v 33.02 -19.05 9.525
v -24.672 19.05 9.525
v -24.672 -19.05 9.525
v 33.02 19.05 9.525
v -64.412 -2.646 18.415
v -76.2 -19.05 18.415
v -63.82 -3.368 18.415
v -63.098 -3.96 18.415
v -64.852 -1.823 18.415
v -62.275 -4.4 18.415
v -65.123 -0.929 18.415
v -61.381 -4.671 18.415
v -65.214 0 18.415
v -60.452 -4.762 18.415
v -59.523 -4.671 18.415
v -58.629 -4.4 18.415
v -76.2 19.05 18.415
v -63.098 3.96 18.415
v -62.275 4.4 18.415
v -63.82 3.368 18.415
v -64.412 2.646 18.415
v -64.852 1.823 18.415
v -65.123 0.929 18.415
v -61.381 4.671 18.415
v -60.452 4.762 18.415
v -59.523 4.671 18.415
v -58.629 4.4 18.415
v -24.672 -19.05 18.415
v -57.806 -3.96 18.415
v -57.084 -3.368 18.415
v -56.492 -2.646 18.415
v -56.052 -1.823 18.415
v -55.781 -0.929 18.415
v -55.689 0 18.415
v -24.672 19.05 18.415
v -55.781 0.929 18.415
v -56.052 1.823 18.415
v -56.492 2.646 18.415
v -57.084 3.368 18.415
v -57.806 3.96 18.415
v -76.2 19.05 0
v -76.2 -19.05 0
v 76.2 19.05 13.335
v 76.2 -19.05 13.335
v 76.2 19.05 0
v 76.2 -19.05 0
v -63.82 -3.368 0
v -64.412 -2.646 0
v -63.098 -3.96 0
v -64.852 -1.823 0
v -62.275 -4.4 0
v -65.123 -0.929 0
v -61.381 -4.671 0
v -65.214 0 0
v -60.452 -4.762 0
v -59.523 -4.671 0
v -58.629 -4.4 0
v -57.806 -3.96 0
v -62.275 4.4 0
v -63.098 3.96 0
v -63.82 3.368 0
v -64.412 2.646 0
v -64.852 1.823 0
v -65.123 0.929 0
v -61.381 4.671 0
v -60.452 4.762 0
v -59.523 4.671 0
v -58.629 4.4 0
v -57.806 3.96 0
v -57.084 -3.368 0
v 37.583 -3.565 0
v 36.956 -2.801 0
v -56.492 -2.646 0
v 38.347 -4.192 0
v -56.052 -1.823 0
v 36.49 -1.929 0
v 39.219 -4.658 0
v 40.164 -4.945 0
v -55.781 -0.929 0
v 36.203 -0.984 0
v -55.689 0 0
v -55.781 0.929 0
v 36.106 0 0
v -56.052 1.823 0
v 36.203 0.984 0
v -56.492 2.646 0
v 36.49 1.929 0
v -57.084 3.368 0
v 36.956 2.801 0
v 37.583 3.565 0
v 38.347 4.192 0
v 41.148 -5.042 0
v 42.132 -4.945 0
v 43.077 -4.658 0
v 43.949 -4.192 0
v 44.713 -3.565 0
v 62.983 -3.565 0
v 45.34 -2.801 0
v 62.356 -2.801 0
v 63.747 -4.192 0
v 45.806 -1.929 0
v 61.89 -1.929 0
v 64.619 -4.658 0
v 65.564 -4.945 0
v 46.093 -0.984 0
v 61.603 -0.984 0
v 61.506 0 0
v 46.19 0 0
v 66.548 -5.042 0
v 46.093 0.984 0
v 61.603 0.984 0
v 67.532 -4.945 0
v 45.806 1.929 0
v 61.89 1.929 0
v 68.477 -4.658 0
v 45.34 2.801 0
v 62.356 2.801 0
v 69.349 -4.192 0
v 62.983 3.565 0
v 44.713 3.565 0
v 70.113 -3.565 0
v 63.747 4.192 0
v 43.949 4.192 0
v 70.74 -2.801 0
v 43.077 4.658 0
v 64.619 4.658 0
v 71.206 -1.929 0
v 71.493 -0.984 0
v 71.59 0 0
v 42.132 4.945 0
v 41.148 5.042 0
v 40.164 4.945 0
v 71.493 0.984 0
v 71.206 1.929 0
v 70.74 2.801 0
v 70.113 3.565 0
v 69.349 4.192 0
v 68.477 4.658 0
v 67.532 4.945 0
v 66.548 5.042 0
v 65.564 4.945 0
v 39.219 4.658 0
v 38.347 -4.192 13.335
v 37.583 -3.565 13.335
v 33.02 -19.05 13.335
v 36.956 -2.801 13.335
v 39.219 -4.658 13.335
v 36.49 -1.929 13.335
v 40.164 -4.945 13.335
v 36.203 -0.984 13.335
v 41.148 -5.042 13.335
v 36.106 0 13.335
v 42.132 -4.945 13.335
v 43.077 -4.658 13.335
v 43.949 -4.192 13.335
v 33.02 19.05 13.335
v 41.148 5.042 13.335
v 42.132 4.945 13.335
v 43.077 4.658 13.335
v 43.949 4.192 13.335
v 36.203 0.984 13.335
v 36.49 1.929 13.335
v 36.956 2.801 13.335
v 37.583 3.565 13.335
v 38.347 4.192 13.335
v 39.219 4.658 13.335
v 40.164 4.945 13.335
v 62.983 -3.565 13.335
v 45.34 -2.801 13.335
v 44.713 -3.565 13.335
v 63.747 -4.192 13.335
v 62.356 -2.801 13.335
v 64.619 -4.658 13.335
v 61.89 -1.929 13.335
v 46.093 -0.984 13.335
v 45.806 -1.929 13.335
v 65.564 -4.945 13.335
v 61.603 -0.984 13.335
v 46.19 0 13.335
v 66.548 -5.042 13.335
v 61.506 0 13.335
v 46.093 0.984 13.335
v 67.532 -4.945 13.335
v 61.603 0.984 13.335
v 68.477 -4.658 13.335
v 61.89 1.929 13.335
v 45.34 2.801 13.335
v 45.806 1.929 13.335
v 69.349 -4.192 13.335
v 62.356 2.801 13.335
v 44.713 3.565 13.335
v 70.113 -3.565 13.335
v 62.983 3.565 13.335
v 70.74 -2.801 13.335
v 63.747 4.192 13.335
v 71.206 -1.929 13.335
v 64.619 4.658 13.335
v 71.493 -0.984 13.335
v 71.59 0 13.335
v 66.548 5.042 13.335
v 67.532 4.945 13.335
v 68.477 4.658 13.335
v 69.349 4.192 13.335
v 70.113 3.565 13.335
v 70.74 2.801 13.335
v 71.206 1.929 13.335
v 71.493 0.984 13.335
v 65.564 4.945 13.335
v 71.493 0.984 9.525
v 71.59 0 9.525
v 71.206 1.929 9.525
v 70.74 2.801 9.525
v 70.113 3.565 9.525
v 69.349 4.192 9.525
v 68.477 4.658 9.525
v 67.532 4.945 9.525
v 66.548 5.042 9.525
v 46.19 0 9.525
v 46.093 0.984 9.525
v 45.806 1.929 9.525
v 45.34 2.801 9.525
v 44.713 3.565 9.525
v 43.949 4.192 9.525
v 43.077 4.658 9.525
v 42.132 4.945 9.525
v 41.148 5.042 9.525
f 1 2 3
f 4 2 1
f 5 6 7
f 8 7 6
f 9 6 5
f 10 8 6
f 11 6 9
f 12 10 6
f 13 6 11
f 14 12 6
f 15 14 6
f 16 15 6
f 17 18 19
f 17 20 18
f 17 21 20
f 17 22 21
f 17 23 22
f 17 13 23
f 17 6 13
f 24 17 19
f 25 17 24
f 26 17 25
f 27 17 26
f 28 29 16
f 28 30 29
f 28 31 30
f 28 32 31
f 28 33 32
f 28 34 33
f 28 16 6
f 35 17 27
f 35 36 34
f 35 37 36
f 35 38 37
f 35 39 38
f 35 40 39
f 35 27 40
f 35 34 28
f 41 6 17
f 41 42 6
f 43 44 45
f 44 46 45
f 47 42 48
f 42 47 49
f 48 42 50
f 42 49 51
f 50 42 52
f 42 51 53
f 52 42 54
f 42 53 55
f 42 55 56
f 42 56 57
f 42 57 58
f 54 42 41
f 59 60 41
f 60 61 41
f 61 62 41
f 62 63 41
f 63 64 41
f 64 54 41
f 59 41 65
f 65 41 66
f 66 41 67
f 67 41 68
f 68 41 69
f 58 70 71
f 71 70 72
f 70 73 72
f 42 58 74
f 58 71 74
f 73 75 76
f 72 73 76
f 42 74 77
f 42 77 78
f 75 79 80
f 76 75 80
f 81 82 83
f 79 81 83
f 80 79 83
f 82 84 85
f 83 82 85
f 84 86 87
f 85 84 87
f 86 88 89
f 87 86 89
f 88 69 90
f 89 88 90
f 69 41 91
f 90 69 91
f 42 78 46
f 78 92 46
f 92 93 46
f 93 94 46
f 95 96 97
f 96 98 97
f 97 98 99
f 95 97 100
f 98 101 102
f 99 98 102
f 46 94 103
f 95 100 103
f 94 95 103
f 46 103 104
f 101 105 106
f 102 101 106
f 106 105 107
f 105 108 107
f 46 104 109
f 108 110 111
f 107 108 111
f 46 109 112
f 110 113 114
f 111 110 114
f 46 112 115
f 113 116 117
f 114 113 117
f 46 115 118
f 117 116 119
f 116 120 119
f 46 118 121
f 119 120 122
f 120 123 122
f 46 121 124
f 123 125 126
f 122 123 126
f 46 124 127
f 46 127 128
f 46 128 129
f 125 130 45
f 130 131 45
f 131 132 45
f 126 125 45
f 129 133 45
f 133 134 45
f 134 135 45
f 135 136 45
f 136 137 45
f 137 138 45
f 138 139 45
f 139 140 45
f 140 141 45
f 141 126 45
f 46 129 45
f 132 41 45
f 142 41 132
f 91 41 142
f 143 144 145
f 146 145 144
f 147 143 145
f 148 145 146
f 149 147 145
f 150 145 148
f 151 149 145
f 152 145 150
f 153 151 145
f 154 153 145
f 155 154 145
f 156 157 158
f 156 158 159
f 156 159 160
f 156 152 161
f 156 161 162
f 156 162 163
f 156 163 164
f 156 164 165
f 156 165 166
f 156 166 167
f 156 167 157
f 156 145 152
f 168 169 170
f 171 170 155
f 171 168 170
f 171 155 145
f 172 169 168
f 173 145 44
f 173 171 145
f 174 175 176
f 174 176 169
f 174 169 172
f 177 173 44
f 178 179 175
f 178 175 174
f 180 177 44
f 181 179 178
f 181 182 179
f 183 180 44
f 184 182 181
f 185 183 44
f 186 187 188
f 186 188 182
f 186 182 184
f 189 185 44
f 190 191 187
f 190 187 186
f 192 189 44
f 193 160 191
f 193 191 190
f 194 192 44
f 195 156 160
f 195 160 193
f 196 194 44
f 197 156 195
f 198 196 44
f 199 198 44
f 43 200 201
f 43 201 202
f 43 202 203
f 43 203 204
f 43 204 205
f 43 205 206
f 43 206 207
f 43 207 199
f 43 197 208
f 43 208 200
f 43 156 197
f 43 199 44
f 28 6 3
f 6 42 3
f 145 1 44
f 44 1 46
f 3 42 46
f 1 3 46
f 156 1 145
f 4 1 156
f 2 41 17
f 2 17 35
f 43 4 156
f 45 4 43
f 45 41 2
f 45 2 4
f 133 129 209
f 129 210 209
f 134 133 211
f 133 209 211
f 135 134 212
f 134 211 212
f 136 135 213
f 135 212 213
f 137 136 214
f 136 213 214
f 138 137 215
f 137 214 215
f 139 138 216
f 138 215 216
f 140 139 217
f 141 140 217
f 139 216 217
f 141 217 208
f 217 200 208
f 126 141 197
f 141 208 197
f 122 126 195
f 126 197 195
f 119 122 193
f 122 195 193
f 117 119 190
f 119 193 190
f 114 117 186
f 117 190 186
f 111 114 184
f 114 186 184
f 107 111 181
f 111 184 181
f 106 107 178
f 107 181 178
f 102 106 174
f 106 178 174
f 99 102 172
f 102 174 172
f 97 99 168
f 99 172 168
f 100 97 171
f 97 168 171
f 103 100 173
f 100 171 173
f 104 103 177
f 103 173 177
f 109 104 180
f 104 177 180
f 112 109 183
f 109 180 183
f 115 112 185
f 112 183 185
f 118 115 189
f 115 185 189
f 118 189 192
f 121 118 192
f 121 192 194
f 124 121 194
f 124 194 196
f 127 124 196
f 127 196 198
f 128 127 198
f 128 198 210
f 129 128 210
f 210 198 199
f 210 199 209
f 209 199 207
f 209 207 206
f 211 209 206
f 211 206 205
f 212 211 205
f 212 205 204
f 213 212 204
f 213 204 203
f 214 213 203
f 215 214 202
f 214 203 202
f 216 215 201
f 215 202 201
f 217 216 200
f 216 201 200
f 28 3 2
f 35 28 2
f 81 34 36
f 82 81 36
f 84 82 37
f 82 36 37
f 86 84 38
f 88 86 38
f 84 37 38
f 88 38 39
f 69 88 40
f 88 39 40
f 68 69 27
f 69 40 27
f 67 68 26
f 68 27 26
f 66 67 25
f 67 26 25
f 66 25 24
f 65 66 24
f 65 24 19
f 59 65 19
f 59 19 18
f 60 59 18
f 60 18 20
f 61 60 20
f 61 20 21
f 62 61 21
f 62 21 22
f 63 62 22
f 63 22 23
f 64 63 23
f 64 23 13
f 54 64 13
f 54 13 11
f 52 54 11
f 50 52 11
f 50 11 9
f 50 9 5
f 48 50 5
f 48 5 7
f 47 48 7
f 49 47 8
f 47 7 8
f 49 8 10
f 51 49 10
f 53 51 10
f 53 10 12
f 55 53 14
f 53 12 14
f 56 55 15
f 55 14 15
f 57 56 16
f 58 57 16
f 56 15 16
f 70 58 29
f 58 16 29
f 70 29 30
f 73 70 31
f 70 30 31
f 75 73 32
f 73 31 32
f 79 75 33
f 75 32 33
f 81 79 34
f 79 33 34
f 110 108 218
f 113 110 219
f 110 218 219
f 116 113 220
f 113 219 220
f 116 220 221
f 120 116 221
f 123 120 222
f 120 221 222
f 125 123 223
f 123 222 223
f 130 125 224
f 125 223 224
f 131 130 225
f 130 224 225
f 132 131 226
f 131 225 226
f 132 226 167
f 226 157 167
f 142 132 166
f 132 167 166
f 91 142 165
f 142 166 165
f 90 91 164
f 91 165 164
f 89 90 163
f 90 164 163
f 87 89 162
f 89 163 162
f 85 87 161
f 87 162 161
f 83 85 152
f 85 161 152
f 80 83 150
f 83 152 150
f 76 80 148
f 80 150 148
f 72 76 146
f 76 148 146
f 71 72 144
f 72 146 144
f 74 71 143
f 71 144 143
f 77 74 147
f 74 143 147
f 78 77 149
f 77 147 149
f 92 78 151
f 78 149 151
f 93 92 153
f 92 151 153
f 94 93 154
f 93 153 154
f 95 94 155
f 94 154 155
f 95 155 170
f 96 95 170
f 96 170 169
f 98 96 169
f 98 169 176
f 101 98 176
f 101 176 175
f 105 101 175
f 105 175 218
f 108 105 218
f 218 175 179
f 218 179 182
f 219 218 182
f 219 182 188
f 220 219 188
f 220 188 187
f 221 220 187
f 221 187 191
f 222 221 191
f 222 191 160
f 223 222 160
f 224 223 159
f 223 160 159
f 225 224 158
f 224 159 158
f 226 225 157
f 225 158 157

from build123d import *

# Parameters (mm, degrees)
SKETCH1_W                        = 152.4
SKETCH1_H                        = 38.1
BOSS_EXTRUDE1_DEPTH              = 9.525
SKETCH5_W                        = 43.18
SKETCH5_H                        = 38.1
BOSS_EXTRUDE3_DEPTH              = 3.81
SKETCH3_W                        = 5.0419
SKETCH3_H                        = 3.81
F_3_8_CLEARANCE_HOLE1_AT_2_COUNT = 2
F_3_8_CLEARANCE_HOLE1_AT_2_PITCH = 25.4
SKETCH4_W                        = 51.528477944
SKETCH4_H                        = 38.1
BOSS_EXTRUDE2_DEPTH              = 8.89
F_3_8_CLEARANCE_HOLE3_D          = 10.0838
SKETCH10_R                       = 4.7625
CUT_EXTRUDE1_DEPTH               = 19.415


with BuildPart() as part:
    # Sketch1 → Boss-Extrude1 (new body)
    with BuildSketch(Plane.XY):
        Rectangle(SKETCH1_W, SKETCH1_H)
    extrude(amount=BOSS_EXTRUDE1_DEPTH)

    # Sketch5 → Boss-Extrude3 (add)
    with BuildSketch(Plane.XY.offset(9.525)):
        with Locations((54.61, 0)):
            Rectangle(SKETCH5_W, SKETCH5_H)
    extrude(amount=BOSS_EXTRUDE3_DEPTH)

    # Sketch3 → 3/8 Clearance Hole1 (revolve, cut)
    with BuildSketch(Plane(origin=(41.148, 0, 9.525), x_dir=(0, 1, 0), z_dir=(1, 0, 0))):
        with Locations((2.52095, 1.905)):
            Rectangle(SKETCH3_W, SKETCH3_H)
    f_3_8_clearance_hole1 = revolve(axis=Axis((41.148, 0, 3.175), (0, 0, 1)), mode=Mode.SUBTRACT)

    # 3/8 Clearance Hole1 at 2: 3/8 Clearance Hole1 ×2
    with Locations(*[(i * F_3_8_CLEARANCE_HOLE1_AT_2_PITCH, 0, 0) for i in range(1, F_3_8_CLEARANCE_HOLE1_AT_2_COUNT)]):
        add(f_3_8_clearance_hole1, mode=Mode.SUBTRACT)

    # Sketch4 → Boss-Extrude2 (add)
    with BuildSketch(Plane.XY.offset(9.525)):
        with Locations((-50.435761028, 0)):
            Rectangle(SKETCH4_W, SKETCH4_H)
    extrude(amount=BOSS_EXTRUDE2_DEPTH)

    # 3/8 Clearance Hole3 (through all)
    with Locations(Plane(origin=(0, 0, 0), x_dir=(-1, 0, 0), z_dir=(0, 0, -1))):
        with Locations((-66.548, 0), (-41.148, 0)):
            Hole(F_3_8_CLEARANCE_HOLE3_D / 2)

    # Sketch10 → Cut-Extrude1 (cut, through all)
    with BuildSketch(Plane.XY.offset(18.415)):
        with Locations((-60.452, 0)):
            Circle(SKETCH10_R)
    extrude(amount=-CUT_EXTRUDE1_DEPTH, mode=Mode.SUBTRACT)


solid = part.part
